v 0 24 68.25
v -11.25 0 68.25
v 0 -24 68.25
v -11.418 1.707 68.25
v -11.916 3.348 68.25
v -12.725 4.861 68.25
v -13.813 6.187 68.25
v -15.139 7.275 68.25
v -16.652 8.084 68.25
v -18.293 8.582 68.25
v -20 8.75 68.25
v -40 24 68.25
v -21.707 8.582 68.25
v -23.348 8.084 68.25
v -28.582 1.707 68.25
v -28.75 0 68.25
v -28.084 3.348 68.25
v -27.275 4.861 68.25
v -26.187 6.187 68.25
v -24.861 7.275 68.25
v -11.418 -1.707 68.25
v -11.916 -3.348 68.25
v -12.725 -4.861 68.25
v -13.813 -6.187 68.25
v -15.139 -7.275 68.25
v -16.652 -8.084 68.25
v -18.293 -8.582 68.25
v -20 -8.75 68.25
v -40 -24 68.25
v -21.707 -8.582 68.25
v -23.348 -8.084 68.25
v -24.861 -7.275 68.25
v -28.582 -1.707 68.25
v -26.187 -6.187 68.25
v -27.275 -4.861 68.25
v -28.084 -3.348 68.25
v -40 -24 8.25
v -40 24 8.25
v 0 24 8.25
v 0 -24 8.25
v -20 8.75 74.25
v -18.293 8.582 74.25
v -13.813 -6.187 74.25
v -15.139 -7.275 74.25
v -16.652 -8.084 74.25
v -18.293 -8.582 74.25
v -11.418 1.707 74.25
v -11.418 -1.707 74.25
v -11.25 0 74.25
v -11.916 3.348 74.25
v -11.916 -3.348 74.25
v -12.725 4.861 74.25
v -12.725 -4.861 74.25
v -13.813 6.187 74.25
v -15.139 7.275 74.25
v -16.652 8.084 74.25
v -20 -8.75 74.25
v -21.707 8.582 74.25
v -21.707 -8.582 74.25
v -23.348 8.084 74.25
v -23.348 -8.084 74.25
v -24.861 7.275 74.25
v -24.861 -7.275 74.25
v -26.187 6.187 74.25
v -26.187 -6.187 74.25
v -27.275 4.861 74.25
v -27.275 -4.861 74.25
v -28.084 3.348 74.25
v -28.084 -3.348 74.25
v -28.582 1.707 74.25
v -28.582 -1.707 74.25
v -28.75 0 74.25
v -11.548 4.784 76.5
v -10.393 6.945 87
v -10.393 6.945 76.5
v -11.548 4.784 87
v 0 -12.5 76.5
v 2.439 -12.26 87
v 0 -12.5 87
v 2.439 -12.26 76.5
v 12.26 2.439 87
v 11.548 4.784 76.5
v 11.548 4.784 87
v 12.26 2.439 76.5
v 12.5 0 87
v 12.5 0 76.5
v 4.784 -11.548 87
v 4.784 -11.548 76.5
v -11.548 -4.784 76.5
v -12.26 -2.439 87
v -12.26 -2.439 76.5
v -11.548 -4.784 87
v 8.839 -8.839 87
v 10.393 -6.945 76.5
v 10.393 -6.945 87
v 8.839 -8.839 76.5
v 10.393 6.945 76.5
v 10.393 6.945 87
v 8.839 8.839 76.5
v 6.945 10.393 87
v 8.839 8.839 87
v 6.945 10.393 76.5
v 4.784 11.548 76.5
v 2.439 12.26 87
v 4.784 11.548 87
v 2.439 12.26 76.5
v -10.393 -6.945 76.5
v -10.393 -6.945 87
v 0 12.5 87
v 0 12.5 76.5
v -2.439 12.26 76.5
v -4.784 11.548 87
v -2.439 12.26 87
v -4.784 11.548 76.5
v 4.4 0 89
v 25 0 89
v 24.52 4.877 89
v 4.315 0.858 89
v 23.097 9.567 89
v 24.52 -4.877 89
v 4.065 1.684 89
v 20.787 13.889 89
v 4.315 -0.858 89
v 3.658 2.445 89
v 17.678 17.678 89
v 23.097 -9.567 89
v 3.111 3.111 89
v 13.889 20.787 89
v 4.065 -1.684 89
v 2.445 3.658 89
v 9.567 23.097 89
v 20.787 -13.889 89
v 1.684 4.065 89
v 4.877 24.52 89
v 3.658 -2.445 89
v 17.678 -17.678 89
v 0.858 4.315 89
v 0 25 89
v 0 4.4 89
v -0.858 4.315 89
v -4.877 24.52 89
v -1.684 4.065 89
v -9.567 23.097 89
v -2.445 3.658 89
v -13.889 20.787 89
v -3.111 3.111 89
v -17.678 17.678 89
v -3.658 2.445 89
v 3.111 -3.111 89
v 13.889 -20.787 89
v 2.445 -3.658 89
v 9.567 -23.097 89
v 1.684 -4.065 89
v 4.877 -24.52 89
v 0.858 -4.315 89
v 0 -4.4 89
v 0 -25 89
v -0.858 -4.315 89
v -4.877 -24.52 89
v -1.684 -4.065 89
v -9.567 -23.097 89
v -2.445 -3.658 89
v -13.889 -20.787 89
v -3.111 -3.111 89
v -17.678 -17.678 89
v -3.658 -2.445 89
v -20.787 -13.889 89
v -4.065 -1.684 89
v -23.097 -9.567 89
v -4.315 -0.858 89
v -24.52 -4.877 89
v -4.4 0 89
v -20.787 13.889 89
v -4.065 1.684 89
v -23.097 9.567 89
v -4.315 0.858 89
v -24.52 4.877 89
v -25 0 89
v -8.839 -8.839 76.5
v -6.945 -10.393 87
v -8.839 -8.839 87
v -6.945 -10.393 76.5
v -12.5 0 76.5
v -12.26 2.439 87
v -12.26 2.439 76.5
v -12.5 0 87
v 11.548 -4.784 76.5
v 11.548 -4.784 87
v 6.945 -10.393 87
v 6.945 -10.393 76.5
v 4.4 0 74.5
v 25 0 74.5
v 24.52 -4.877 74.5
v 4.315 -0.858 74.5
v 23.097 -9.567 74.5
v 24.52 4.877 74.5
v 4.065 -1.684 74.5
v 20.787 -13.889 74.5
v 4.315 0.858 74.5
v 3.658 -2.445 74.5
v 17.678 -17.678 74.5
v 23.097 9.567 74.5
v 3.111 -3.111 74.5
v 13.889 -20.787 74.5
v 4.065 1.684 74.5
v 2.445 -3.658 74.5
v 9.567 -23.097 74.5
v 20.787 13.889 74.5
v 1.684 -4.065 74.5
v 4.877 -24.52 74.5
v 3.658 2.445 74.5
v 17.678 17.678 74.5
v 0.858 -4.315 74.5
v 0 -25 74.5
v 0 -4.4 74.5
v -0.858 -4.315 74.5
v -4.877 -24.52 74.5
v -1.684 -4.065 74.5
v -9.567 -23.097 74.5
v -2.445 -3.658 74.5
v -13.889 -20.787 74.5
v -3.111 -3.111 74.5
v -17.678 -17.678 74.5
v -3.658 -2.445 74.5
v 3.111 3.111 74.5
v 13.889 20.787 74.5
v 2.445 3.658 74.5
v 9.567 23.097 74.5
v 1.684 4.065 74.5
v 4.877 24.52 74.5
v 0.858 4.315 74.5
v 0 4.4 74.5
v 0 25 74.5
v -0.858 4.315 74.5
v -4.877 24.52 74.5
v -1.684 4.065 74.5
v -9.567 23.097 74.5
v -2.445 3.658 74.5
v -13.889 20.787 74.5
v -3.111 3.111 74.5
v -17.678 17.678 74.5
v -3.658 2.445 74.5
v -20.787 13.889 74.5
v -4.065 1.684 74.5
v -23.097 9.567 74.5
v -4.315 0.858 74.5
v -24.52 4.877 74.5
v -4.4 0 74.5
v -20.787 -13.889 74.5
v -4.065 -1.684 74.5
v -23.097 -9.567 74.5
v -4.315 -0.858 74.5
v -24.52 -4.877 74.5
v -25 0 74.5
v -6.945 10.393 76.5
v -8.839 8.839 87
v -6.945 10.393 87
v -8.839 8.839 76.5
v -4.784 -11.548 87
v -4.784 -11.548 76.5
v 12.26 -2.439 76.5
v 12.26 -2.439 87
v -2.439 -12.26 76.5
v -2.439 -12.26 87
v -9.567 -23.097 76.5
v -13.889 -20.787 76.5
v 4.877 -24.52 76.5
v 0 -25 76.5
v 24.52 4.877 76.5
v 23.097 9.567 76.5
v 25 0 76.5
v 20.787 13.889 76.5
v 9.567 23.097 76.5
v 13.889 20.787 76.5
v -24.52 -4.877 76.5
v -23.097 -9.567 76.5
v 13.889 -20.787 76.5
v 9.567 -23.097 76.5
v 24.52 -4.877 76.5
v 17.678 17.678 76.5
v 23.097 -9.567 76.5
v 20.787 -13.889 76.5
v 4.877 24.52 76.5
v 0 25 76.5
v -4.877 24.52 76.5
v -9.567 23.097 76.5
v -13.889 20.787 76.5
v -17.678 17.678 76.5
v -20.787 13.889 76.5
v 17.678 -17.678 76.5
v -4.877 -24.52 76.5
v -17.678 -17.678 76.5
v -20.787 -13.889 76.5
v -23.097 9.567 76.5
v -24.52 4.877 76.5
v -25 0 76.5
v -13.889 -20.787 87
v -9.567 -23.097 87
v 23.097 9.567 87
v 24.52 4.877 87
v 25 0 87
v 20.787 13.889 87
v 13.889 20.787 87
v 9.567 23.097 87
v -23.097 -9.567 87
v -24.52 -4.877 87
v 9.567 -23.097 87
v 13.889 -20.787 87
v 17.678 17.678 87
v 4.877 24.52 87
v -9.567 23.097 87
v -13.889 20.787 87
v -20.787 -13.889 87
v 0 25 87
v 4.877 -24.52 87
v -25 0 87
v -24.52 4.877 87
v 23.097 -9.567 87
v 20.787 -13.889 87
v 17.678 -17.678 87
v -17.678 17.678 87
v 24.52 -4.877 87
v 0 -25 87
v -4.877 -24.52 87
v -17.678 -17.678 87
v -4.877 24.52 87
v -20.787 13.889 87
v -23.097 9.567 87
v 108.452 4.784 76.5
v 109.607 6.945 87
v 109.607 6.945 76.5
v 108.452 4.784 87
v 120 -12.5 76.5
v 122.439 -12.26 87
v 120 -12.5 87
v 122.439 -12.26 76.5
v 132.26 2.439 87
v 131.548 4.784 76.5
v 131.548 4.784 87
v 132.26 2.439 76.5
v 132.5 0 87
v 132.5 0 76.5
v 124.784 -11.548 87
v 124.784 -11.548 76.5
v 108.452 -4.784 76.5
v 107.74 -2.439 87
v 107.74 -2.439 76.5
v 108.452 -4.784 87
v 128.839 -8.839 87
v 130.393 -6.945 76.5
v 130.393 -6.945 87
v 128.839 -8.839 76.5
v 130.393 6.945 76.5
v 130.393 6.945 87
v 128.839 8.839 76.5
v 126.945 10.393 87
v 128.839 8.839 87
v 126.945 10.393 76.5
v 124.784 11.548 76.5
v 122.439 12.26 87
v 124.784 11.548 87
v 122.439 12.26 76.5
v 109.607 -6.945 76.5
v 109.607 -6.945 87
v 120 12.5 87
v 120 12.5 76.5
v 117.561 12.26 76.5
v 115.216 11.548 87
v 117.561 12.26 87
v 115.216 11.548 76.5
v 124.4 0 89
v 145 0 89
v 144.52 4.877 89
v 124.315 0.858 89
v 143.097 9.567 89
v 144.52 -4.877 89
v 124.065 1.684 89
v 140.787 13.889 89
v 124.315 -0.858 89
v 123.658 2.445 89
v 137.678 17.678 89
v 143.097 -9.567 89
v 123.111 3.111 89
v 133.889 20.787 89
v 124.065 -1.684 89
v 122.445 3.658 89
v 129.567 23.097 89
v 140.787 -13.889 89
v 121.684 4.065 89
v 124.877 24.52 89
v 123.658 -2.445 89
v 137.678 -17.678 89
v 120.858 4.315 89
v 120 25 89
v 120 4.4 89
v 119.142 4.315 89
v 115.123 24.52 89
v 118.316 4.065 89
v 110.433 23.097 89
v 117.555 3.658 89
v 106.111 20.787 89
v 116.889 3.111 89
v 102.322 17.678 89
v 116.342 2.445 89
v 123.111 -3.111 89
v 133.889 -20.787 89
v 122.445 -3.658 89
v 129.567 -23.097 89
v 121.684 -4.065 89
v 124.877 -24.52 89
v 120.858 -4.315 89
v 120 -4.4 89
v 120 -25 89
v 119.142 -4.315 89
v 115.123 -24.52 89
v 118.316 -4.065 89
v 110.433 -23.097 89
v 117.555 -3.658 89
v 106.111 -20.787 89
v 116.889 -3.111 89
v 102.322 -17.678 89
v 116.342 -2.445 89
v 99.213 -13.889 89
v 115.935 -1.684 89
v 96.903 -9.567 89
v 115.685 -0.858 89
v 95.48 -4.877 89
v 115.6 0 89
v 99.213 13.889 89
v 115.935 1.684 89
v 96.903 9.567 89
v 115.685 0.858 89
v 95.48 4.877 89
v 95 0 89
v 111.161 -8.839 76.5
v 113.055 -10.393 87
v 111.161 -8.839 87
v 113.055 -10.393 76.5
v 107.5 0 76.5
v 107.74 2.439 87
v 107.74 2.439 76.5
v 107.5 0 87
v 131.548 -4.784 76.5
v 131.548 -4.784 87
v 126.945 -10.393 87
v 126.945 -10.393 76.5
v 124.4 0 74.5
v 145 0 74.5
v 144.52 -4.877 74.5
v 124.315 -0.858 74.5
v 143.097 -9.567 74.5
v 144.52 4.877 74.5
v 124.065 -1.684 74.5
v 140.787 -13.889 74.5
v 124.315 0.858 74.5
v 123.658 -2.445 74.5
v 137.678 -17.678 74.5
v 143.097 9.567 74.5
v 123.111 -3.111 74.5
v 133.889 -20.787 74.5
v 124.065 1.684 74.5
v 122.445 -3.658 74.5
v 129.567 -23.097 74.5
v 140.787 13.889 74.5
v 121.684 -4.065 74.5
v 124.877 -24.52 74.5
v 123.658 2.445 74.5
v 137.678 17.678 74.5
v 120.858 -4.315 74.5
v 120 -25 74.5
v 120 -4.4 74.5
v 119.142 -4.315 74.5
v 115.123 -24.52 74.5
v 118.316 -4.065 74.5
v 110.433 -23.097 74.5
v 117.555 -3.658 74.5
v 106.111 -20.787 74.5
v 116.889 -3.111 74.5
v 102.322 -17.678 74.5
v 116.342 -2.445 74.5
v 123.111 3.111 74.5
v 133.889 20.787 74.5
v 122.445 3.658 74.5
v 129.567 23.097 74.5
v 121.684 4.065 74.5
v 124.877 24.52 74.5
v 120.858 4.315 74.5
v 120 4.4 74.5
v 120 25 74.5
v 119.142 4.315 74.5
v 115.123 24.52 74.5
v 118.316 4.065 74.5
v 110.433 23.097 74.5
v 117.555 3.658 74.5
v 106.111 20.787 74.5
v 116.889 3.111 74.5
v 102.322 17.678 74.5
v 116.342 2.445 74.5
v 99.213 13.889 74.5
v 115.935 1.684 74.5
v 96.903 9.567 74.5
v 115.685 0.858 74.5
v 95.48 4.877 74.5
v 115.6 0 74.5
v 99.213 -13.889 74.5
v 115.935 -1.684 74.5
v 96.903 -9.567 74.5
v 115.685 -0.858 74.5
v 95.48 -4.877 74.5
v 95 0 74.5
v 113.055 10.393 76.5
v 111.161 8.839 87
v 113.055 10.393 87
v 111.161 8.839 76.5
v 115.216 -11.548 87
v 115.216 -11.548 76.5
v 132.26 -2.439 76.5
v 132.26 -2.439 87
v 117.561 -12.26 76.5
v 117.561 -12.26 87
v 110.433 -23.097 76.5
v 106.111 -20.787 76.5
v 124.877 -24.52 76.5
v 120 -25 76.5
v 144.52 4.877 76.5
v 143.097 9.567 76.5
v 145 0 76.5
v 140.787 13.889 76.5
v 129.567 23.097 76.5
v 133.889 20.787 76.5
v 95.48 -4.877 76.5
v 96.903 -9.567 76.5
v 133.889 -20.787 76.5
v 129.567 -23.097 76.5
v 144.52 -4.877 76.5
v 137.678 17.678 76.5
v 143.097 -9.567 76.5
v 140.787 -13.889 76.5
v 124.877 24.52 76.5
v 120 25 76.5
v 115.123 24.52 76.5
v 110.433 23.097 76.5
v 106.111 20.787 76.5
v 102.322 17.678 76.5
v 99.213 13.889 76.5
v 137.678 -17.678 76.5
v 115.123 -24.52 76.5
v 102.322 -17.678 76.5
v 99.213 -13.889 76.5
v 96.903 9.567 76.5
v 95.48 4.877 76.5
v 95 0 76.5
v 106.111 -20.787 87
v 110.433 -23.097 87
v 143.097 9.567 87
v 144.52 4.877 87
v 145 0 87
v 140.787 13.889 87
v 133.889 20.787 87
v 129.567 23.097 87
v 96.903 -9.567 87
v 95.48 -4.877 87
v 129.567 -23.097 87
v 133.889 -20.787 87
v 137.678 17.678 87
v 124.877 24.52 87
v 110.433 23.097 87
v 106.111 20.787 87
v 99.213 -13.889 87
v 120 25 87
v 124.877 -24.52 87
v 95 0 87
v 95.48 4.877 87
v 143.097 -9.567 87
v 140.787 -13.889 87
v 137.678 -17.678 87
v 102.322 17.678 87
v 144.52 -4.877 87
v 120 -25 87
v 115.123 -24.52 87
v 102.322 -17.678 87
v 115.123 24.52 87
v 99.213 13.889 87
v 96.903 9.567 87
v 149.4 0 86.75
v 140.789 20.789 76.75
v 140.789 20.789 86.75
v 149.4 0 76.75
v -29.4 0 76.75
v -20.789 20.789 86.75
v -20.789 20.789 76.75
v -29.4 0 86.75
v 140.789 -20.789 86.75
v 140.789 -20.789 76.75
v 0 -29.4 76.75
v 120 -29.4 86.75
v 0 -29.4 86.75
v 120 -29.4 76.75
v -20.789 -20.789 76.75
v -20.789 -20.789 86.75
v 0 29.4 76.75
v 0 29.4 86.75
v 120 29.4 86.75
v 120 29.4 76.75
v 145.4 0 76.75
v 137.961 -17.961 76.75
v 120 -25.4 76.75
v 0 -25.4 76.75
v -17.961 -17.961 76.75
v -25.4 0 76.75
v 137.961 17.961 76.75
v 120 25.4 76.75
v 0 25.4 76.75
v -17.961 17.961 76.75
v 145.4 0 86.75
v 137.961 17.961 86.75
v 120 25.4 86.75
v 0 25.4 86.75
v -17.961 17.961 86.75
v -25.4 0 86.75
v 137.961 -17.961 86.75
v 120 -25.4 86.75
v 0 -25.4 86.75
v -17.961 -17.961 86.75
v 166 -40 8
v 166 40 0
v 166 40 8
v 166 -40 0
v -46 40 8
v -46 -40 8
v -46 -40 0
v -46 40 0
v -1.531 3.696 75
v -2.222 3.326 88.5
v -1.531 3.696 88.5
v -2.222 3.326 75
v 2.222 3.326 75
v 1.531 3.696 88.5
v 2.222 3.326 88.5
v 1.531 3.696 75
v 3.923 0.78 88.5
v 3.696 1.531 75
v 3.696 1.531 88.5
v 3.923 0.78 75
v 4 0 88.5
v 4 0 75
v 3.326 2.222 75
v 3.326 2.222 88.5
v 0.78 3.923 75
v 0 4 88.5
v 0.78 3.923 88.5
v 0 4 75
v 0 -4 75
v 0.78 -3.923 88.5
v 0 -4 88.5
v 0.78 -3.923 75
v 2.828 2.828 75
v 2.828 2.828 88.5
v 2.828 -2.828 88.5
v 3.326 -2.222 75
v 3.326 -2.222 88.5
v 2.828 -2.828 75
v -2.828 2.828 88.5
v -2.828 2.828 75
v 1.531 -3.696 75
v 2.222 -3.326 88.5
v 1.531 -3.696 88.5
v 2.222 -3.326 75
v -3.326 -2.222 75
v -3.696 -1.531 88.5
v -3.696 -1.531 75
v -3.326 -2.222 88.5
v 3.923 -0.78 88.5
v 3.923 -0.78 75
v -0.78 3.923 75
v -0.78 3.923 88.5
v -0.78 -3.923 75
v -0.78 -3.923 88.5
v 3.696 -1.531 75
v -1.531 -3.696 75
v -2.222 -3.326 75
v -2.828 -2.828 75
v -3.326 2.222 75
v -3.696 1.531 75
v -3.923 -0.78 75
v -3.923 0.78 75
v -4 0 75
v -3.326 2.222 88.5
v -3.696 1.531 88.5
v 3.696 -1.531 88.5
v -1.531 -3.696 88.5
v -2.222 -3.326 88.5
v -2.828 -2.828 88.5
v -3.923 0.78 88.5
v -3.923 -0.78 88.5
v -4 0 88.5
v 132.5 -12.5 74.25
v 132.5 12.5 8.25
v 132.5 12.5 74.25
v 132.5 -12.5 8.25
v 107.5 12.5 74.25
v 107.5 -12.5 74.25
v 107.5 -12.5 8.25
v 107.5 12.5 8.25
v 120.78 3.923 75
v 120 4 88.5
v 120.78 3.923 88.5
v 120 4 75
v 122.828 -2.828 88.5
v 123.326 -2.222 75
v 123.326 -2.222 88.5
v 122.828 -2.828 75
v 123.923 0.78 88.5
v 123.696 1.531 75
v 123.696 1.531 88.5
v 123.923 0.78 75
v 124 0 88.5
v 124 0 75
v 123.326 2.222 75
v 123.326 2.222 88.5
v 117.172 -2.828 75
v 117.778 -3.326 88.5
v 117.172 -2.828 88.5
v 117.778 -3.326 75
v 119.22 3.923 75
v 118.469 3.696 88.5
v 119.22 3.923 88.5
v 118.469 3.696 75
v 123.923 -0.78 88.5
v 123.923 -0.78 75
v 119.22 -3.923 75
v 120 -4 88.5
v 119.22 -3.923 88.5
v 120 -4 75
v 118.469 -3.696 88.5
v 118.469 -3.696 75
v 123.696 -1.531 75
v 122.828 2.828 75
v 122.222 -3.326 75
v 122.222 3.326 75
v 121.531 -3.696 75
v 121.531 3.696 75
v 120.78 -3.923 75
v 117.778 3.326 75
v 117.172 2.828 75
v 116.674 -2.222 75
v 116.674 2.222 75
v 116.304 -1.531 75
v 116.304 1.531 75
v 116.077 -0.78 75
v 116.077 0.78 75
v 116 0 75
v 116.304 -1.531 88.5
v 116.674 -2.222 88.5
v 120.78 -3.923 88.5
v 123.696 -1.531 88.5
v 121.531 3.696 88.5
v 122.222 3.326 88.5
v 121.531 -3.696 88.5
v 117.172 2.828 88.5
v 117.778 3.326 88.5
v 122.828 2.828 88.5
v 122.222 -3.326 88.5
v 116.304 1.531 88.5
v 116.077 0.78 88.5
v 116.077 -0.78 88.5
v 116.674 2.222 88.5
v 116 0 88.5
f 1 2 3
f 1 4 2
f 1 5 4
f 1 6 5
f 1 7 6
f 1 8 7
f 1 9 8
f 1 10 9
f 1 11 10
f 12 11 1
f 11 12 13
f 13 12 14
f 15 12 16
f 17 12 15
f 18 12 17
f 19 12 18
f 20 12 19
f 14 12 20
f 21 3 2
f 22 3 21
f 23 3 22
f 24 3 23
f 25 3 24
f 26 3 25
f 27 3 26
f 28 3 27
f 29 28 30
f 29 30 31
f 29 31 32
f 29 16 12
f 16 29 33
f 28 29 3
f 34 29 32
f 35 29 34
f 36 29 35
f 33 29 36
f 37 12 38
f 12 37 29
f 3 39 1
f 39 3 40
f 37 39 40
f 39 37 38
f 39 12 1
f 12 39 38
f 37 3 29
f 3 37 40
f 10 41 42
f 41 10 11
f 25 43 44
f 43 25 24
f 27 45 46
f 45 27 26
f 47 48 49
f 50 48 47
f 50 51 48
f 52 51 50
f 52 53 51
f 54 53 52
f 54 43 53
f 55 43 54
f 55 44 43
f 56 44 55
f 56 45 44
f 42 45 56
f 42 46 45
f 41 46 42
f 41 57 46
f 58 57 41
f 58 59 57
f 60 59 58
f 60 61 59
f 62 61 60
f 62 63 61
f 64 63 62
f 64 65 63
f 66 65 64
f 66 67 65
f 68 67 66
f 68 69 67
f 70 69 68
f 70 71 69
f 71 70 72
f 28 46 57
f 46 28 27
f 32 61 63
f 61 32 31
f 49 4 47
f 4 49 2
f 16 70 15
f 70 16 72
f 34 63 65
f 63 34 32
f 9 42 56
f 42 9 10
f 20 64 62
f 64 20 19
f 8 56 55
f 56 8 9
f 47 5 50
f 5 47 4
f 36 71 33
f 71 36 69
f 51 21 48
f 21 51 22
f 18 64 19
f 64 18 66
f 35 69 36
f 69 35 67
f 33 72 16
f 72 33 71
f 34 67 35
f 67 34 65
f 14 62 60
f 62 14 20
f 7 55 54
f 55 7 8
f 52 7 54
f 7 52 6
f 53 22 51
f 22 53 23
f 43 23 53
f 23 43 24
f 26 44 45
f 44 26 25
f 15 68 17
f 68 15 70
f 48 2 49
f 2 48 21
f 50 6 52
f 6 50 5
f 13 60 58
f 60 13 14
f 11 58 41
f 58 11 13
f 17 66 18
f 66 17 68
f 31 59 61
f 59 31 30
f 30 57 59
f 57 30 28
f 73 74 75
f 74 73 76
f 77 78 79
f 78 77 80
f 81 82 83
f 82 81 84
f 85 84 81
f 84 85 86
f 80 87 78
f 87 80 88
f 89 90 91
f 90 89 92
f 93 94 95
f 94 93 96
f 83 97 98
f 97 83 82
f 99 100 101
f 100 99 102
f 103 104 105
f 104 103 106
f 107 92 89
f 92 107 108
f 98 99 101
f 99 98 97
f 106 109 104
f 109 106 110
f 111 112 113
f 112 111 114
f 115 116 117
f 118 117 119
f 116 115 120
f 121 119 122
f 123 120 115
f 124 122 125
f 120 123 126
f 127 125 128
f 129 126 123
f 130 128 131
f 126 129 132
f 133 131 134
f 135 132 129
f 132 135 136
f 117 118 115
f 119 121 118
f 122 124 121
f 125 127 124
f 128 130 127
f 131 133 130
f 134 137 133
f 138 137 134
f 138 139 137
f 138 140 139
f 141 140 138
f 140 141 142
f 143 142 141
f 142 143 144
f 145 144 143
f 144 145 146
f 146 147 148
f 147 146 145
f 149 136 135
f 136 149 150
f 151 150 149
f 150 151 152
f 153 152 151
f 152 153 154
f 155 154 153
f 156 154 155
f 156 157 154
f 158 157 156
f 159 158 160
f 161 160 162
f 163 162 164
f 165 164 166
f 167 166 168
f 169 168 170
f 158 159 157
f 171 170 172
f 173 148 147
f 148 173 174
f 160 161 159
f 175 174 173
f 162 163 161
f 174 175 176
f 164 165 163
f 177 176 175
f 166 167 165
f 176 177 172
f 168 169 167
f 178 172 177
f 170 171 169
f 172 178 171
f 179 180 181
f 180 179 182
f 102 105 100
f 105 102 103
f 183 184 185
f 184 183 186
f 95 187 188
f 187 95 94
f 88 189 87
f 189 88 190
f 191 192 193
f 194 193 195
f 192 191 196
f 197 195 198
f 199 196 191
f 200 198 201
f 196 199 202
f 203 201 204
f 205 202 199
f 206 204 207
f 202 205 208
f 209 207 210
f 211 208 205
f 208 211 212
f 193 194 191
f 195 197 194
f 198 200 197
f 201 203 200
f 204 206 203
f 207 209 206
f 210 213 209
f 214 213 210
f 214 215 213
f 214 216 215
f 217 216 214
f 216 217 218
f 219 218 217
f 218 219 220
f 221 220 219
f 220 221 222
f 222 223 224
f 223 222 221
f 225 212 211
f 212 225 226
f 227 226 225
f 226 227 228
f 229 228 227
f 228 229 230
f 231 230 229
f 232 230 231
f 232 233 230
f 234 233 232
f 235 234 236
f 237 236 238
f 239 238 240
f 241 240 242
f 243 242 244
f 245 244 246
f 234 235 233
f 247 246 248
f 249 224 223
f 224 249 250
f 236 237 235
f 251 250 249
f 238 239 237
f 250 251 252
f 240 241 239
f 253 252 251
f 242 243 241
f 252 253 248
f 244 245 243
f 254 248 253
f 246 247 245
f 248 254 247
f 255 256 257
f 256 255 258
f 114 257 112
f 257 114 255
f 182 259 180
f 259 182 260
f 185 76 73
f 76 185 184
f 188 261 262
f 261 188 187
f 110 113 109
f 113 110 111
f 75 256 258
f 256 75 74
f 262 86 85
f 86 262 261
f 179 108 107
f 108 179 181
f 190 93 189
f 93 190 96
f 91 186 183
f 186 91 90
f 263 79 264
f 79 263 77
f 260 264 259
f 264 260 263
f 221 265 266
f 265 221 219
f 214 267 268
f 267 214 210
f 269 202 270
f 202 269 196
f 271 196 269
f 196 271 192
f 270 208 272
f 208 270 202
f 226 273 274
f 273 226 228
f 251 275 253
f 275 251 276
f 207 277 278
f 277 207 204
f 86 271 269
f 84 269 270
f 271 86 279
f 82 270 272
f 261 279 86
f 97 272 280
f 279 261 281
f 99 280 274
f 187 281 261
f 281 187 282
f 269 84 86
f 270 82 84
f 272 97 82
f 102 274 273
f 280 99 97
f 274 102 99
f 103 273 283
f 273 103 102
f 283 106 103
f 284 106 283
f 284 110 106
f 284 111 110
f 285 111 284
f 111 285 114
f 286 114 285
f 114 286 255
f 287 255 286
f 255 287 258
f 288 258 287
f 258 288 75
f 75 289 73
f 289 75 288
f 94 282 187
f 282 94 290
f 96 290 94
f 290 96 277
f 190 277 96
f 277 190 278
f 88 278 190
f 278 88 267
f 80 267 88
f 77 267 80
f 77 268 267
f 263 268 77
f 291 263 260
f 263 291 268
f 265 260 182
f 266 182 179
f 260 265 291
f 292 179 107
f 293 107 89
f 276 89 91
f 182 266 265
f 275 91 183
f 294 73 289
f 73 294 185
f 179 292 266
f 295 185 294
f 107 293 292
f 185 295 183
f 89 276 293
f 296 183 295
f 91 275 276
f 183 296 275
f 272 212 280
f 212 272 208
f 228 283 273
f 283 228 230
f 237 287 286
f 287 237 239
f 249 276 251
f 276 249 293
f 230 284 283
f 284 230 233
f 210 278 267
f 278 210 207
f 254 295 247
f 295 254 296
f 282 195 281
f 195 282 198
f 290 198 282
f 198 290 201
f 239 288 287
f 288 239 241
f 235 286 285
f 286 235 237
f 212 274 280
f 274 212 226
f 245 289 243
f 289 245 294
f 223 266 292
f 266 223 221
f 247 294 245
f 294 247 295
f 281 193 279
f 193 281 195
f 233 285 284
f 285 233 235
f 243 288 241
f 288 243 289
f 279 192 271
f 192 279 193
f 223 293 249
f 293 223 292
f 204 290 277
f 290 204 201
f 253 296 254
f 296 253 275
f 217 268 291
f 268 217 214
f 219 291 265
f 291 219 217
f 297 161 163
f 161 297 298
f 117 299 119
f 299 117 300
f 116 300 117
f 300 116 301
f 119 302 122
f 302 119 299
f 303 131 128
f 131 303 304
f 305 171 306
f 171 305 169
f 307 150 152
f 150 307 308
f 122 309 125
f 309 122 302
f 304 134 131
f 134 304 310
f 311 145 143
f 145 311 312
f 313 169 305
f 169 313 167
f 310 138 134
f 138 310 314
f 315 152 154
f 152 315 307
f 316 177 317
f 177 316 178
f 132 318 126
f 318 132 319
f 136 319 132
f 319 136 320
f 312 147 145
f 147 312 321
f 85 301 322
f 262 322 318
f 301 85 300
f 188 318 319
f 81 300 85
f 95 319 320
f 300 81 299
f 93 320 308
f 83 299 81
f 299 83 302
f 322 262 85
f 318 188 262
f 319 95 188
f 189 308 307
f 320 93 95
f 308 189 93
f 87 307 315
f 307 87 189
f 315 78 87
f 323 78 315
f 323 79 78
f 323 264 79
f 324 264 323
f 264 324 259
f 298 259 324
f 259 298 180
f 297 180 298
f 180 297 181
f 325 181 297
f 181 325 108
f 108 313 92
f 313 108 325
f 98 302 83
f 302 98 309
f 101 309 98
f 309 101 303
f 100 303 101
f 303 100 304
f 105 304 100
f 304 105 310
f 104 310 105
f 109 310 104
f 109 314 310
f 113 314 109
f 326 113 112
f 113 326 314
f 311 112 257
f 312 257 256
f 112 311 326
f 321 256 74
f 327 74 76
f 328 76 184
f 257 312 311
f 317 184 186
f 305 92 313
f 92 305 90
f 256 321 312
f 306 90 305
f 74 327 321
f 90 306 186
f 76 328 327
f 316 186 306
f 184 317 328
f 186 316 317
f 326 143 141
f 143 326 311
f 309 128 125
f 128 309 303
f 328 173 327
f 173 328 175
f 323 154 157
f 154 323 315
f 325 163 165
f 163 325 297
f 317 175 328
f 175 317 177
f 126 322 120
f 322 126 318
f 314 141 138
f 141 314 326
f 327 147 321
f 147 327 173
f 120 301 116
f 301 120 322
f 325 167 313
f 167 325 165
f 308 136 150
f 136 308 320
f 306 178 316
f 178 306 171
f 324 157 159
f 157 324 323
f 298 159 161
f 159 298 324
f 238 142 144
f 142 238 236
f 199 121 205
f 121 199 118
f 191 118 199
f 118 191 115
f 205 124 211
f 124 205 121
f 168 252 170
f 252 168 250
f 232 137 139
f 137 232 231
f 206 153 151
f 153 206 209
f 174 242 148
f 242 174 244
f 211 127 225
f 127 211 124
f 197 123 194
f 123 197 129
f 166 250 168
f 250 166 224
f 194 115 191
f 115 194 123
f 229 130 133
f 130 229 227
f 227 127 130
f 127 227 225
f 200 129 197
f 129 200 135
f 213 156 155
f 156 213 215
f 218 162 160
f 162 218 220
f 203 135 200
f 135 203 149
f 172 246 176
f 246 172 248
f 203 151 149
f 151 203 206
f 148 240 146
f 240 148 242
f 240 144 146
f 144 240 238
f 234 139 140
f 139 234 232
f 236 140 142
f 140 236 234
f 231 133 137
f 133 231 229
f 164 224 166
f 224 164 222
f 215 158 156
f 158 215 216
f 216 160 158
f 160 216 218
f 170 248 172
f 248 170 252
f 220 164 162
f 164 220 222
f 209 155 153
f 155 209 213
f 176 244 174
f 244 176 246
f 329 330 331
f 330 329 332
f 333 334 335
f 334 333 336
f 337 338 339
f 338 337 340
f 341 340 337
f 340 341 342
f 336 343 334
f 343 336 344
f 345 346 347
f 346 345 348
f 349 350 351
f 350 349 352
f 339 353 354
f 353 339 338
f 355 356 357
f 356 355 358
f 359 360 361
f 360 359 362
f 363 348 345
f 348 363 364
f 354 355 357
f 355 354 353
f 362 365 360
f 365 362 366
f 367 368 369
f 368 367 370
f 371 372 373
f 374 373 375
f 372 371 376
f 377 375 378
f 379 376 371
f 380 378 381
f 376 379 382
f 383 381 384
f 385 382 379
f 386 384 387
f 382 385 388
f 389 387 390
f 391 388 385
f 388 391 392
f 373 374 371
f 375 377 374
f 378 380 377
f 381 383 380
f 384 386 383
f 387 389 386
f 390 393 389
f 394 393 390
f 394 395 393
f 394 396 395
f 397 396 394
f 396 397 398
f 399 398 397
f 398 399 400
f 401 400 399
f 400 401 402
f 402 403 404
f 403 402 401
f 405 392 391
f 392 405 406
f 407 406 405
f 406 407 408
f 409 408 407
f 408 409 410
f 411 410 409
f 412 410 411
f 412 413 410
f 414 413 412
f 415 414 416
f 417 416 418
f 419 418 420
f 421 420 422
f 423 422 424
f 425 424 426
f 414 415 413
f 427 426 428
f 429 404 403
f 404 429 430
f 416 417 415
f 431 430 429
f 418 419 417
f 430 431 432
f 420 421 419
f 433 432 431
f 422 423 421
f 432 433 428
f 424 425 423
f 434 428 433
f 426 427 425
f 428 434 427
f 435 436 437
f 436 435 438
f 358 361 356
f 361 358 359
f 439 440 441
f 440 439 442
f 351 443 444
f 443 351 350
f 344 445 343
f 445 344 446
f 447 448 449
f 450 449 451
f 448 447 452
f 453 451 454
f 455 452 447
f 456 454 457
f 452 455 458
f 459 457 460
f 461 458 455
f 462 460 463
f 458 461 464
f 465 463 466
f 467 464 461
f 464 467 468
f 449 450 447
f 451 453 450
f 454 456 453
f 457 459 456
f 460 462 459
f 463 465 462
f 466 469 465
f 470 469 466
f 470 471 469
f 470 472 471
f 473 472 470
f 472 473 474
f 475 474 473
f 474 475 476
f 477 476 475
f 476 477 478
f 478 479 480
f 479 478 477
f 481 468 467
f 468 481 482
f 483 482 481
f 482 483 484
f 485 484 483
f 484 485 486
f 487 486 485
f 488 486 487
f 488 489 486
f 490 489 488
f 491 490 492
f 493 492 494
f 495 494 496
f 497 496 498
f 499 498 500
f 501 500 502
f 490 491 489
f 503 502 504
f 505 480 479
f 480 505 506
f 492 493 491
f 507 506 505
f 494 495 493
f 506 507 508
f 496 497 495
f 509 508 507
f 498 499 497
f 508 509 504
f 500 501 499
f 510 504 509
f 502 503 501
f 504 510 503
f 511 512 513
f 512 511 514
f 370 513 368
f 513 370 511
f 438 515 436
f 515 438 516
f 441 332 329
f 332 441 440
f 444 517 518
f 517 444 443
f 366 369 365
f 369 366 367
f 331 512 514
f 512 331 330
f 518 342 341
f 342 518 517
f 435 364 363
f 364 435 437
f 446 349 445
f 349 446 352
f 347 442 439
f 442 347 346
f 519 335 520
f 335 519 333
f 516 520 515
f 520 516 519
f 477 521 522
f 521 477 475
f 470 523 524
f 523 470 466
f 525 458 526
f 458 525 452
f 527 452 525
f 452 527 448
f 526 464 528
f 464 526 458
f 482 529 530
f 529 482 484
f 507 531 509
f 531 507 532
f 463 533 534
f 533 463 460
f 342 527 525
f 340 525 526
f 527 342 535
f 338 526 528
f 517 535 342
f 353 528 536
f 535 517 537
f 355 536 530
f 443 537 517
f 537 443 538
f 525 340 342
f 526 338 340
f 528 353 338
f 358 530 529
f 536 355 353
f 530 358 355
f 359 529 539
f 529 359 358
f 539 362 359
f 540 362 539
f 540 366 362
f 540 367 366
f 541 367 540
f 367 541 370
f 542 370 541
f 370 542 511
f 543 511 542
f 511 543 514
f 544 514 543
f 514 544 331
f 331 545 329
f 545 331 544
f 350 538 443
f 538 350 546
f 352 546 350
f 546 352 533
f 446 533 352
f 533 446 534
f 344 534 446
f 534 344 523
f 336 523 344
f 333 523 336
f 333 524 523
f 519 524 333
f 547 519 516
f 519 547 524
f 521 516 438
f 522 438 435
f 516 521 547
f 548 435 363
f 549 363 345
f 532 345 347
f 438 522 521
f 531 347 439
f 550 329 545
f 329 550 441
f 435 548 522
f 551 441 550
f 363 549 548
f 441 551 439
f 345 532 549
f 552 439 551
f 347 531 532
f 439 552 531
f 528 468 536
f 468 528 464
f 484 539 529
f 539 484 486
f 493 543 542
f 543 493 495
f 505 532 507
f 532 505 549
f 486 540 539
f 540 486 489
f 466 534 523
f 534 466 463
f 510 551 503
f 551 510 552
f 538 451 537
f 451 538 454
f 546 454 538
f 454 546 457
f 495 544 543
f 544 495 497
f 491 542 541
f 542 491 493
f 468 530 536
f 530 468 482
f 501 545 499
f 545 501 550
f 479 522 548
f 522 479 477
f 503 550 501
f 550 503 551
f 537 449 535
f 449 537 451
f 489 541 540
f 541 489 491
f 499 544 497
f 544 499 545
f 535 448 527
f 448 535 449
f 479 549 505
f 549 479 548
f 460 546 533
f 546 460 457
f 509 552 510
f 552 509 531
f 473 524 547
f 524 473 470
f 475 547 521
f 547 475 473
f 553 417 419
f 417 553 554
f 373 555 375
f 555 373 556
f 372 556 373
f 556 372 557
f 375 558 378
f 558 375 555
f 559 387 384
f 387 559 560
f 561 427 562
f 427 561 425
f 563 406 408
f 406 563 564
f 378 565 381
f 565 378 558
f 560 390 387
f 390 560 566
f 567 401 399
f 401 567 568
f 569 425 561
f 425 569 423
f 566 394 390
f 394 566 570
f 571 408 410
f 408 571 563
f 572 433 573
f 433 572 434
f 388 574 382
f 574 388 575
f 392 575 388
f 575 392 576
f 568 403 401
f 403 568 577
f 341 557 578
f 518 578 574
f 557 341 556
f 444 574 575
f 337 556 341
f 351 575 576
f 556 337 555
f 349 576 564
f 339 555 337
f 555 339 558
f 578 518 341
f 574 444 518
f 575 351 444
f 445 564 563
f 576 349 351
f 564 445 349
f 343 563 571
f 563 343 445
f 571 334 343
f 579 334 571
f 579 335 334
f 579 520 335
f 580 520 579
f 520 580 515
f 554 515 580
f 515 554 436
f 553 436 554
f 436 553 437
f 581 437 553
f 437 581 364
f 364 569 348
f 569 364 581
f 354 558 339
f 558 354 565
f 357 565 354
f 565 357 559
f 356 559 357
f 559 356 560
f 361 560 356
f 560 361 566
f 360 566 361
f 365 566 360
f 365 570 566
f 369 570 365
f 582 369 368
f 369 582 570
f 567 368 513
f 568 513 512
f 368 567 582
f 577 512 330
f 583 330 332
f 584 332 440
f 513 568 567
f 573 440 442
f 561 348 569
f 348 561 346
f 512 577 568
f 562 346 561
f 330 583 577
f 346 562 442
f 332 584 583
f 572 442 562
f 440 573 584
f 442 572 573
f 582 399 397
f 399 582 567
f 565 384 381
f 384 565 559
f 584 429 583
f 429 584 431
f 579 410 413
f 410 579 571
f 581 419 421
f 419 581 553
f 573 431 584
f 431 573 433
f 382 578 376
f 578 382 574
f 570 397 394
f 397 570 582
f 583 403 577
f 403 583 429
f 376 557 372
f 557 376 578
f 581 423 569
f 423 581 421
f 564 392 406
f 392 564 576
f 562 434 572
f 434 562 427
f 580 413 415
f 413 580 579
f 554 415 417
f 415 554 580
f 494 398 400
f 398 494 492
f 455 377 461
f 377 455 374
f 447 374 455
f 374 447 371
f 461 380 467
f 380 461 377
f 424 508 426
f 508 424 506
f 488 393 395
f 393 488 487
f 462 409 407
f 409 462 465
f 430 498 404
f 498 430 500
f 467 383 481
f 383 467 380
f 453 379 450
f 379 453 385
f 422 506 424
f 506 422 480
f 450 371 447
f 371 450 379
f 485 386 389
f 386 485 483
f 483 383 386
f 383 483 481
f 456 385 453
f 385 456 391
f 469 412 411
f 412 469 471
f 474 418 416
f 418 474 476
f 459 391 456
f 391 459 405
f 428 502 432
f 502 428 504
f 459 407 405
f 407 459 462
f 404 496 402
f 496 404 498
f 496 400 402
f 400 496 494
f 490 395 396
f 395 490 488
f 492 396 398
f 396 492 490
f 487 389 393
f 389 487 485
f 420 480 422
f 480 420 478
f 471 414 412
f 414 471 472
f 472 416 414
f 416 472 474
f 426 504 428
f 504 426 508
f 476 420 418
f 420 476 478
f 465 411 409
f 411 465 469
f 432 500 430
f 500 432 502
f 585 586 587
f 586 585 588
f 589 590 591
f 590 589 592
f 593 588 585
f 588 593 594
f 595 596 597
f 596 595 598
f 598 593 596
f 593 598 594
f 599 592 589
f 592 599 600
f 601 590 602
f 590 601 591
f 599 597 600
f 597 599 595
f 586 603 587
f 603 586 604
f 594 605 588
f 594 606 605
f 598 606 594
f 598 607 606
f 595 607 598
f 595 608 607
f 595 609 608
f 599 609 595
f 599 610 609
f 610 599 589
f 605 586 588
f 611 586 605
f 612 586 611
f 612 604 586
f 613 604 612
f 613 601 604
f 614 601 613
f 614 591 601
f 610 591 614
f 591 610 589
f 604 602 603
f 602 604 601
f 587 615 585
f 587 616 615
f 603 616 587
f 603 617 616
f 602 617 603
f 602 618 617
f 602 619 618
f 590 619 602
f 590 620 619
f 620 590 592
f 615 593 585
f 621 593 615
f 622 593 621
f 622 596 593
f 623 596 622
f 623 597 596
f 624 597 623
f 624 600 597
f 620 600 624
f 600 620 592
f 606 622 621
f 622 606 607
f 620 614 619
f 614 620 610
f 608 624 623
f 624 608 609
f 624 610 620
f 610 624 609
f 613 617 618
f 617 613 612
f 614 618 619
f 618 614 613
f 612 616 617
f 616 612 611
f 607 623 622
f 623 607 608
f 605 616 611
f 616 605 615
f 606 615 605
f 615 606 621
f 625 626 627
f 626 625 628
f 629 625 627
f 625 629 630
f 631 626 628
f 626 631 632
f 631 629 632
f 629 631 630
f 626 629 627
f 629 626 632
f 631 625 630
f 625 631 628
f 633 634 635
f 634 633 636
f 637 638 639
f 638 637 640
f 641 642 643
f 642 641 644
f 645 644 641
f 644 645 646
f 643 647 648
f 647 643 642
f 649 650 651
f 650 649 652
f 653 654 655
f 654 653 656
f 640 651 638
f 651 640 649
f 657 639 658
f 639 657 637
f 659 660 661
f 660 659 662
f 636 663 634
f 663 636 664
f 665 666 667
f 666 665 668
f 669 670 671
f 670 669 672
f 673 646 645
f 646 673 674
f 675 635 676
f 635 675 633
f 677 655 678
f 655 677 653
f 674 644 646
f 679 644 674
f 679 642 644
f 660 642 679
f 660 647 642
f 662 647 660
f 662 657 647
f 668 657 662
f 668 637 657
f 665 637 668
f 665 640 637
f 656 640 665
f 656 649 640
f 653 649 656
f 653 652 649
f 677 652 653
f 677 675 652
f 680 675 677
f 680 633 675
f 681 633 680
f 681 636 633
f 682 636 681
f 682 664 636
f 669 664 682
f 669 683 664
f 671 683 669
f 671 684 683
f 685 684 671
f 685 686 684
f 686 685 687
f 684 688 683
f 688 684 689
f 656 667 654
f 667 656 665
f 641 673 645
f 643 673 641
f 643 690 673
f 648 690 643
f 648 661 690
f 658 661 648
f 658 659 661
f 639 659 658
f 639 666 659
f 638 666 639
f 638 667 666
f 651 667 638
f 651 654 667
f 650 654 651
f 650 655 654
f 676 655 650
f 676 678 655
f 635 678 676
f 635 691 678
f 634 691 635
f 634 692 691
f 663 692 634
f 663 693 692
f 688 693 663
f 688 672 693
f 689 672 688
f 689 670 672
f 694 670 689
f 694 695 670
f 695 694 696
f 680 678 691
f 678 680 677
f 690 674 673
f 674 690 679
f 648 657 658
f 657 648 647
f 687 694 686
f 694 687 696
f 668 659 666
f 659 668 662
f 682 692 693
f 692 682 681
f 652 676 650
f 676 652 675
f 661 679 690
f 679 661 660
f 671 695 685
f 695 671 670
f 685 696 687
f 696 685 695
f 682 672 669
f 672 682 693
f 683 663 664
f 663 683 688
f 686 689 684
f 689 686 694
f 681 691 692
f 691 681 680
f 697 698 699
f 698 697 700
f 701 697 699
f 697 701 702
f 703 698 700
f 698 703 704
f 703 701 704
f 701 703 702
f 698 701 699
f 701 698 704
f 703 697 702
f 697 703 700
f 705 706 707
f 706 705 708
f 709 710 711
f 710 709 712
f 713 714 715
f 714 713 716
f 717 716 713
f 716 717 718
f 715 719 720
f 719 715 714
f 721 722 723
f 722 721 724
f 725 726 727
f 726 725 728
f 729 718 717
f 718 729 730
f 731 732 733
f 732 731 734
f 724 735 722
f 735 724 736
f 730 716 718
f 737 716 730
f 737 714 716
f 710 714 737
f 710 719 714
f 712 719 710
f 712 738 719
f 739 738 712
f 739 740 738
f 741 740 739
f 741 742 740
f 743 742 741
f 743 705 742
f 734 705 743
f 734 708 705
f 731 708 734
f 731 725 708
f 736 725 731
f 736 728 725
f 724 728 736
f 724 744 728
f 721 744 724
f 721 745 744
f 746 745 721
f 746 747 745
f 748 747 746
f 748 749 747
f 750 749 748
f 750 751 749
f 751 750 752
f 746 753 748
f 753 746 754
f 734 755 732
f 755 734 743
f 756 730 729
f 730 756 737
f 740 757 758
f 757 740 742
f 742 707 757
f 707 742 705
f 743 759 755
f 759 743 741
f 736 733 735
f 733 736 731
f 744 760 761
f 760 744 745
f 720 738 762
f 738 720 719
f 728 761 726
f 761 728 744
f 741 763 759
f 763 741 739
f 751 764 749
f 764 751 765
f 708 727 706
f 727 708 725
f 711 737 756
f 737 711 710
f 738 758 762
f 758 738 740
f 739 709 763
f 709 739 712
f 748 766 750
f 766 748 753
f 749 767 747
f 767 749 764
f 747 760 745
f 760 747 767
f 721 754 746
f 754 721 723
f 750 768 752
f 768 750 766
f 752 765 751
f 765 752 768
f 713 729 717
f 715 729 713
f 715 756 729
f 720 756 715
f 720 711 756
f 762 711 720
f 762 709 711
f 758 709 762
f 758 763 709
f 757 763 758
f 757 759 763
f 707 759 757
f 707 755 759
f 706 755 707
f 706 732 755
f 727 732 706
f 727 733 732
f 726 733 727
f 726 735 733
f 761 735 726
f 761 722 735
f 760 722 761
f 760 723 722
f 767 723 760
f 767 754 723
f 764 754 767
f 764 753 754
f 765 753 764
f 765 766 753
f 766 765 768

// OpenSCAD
$fn = 32;

// ------------------------------------------------------------------------
// Motor belt drive: span 120 mm, pulleys d50, belt 10 mm wide
// Every part is its own module, assembly() places every instance.
// ------------------------------------------------------------------------

// --- part 1 ---
module base_plate() {
  difference() {
    translate([-106, -40, 0]) cube([212, 80, 8]);
  }
}

// --- part 2 ---
module motor() {
  union() {
    translate([-30, -24, 0]) cube([60, 48, 40]);
    translate([33, 0, 20]) rotate([0, 90, 0]) cylinder(h = 6, d = 17.5, center = true);
  }
}

// --- part 3 ---
module drive_shaft() {
  translate([0, 0, -6.75]) cylinder(h = 13.5, d = 8);
}

// --- part 4 ---
module pulley_drive() {
  difference() {
    union() {
      cylinder(h = 14.5, d = 25);
      cylinder(h = 2, d = 50);
      translate([0, 0, 12.5]) cylinder(h = 2, d = 50);
    }
    translate([0, 0, -1]) cylinder(h = 16.5, d = 8.8);
  }
}

// --- part 5 ---
module idler_post() {
  translate([-12.5, -12.5, 0]) cube([25, 25, 66]);
}

// --- part 6 ---
module driven_shaft() {
  translate([0, 0, -6.75]) cylinder(h = 13.5, d = 8);
}

// --- part 7 ---
module pulley_driven() {
  difference() {
    union() {
      cylinder(h = 14.5, d = 25);
      cylinder(h = 2, d = 50);
      translate([0, 0, 12.5]) cylinder(h = 2, d = 50);
    }
    translate([0, 0, -1]) cylinder(h = 16.5, d = 8.8);
  }
}

// --- part 8 ---
module drive_belt() {
  difference() {
    linear_extrude(height = 10) polygon(points = concat([for (a = [90 : 45 : 270]) [29.4 * cos(a), 29.4 * sin(a)]], [for (a = [270 : 45 : 450]) [120 + 29.4 * cos(a), 29.4 * sin(a)]]));
    translate([0, 0, -1]) linear_extrude(height = 12) polygon(points = concat([for (a = [90 : 45 : 270]) [25.4 * cos(a), 25.4 * sin(a)]], [for (a = [270 : 45 : 450]) [120 + 25.4 * cos(a), 25.4 * sin(a)]]));
  }
}

// --- assembly ---
module assembly() {
  color([0.80, 0.24, 0.20]) translate([60, 0, 0]) rotate([0, 0, 0]) base_plate();
  color([0.20, 0.45, 0.75]) translate([0, 0, 38.25]) rotate([0, 270, 0]) motor();
  color([0.25, 0.62, 0.32]) translate([0, 0, 81.75]) rotate([0, 0, 0]) drive_shaft();
  color([0.92, 0.70, 0.18]) translate([0, 0, 74.5]) rotate([0, 0, 0]) pulley_drive();
  color([0.58, 0.35, 0.70]) translate([120, 0, 8.25]) rotate([0, 0, 0]) idler_post();
  color([0.16, 0.66, 0.66]) translate([120, 0, 81.75]) rotate([0, 0, 0]) driven_shaft();
  color([0.85, 0.48, 0.18]) translate([120, 0, 74.5]) rotate([0, 0, 0]) pulley_driven();
  color([0.55, 0.60, 0.65]) translate([0, 0, 76.75]) rotate([0, 0, 0]) drive_belt();
}

assembly();
